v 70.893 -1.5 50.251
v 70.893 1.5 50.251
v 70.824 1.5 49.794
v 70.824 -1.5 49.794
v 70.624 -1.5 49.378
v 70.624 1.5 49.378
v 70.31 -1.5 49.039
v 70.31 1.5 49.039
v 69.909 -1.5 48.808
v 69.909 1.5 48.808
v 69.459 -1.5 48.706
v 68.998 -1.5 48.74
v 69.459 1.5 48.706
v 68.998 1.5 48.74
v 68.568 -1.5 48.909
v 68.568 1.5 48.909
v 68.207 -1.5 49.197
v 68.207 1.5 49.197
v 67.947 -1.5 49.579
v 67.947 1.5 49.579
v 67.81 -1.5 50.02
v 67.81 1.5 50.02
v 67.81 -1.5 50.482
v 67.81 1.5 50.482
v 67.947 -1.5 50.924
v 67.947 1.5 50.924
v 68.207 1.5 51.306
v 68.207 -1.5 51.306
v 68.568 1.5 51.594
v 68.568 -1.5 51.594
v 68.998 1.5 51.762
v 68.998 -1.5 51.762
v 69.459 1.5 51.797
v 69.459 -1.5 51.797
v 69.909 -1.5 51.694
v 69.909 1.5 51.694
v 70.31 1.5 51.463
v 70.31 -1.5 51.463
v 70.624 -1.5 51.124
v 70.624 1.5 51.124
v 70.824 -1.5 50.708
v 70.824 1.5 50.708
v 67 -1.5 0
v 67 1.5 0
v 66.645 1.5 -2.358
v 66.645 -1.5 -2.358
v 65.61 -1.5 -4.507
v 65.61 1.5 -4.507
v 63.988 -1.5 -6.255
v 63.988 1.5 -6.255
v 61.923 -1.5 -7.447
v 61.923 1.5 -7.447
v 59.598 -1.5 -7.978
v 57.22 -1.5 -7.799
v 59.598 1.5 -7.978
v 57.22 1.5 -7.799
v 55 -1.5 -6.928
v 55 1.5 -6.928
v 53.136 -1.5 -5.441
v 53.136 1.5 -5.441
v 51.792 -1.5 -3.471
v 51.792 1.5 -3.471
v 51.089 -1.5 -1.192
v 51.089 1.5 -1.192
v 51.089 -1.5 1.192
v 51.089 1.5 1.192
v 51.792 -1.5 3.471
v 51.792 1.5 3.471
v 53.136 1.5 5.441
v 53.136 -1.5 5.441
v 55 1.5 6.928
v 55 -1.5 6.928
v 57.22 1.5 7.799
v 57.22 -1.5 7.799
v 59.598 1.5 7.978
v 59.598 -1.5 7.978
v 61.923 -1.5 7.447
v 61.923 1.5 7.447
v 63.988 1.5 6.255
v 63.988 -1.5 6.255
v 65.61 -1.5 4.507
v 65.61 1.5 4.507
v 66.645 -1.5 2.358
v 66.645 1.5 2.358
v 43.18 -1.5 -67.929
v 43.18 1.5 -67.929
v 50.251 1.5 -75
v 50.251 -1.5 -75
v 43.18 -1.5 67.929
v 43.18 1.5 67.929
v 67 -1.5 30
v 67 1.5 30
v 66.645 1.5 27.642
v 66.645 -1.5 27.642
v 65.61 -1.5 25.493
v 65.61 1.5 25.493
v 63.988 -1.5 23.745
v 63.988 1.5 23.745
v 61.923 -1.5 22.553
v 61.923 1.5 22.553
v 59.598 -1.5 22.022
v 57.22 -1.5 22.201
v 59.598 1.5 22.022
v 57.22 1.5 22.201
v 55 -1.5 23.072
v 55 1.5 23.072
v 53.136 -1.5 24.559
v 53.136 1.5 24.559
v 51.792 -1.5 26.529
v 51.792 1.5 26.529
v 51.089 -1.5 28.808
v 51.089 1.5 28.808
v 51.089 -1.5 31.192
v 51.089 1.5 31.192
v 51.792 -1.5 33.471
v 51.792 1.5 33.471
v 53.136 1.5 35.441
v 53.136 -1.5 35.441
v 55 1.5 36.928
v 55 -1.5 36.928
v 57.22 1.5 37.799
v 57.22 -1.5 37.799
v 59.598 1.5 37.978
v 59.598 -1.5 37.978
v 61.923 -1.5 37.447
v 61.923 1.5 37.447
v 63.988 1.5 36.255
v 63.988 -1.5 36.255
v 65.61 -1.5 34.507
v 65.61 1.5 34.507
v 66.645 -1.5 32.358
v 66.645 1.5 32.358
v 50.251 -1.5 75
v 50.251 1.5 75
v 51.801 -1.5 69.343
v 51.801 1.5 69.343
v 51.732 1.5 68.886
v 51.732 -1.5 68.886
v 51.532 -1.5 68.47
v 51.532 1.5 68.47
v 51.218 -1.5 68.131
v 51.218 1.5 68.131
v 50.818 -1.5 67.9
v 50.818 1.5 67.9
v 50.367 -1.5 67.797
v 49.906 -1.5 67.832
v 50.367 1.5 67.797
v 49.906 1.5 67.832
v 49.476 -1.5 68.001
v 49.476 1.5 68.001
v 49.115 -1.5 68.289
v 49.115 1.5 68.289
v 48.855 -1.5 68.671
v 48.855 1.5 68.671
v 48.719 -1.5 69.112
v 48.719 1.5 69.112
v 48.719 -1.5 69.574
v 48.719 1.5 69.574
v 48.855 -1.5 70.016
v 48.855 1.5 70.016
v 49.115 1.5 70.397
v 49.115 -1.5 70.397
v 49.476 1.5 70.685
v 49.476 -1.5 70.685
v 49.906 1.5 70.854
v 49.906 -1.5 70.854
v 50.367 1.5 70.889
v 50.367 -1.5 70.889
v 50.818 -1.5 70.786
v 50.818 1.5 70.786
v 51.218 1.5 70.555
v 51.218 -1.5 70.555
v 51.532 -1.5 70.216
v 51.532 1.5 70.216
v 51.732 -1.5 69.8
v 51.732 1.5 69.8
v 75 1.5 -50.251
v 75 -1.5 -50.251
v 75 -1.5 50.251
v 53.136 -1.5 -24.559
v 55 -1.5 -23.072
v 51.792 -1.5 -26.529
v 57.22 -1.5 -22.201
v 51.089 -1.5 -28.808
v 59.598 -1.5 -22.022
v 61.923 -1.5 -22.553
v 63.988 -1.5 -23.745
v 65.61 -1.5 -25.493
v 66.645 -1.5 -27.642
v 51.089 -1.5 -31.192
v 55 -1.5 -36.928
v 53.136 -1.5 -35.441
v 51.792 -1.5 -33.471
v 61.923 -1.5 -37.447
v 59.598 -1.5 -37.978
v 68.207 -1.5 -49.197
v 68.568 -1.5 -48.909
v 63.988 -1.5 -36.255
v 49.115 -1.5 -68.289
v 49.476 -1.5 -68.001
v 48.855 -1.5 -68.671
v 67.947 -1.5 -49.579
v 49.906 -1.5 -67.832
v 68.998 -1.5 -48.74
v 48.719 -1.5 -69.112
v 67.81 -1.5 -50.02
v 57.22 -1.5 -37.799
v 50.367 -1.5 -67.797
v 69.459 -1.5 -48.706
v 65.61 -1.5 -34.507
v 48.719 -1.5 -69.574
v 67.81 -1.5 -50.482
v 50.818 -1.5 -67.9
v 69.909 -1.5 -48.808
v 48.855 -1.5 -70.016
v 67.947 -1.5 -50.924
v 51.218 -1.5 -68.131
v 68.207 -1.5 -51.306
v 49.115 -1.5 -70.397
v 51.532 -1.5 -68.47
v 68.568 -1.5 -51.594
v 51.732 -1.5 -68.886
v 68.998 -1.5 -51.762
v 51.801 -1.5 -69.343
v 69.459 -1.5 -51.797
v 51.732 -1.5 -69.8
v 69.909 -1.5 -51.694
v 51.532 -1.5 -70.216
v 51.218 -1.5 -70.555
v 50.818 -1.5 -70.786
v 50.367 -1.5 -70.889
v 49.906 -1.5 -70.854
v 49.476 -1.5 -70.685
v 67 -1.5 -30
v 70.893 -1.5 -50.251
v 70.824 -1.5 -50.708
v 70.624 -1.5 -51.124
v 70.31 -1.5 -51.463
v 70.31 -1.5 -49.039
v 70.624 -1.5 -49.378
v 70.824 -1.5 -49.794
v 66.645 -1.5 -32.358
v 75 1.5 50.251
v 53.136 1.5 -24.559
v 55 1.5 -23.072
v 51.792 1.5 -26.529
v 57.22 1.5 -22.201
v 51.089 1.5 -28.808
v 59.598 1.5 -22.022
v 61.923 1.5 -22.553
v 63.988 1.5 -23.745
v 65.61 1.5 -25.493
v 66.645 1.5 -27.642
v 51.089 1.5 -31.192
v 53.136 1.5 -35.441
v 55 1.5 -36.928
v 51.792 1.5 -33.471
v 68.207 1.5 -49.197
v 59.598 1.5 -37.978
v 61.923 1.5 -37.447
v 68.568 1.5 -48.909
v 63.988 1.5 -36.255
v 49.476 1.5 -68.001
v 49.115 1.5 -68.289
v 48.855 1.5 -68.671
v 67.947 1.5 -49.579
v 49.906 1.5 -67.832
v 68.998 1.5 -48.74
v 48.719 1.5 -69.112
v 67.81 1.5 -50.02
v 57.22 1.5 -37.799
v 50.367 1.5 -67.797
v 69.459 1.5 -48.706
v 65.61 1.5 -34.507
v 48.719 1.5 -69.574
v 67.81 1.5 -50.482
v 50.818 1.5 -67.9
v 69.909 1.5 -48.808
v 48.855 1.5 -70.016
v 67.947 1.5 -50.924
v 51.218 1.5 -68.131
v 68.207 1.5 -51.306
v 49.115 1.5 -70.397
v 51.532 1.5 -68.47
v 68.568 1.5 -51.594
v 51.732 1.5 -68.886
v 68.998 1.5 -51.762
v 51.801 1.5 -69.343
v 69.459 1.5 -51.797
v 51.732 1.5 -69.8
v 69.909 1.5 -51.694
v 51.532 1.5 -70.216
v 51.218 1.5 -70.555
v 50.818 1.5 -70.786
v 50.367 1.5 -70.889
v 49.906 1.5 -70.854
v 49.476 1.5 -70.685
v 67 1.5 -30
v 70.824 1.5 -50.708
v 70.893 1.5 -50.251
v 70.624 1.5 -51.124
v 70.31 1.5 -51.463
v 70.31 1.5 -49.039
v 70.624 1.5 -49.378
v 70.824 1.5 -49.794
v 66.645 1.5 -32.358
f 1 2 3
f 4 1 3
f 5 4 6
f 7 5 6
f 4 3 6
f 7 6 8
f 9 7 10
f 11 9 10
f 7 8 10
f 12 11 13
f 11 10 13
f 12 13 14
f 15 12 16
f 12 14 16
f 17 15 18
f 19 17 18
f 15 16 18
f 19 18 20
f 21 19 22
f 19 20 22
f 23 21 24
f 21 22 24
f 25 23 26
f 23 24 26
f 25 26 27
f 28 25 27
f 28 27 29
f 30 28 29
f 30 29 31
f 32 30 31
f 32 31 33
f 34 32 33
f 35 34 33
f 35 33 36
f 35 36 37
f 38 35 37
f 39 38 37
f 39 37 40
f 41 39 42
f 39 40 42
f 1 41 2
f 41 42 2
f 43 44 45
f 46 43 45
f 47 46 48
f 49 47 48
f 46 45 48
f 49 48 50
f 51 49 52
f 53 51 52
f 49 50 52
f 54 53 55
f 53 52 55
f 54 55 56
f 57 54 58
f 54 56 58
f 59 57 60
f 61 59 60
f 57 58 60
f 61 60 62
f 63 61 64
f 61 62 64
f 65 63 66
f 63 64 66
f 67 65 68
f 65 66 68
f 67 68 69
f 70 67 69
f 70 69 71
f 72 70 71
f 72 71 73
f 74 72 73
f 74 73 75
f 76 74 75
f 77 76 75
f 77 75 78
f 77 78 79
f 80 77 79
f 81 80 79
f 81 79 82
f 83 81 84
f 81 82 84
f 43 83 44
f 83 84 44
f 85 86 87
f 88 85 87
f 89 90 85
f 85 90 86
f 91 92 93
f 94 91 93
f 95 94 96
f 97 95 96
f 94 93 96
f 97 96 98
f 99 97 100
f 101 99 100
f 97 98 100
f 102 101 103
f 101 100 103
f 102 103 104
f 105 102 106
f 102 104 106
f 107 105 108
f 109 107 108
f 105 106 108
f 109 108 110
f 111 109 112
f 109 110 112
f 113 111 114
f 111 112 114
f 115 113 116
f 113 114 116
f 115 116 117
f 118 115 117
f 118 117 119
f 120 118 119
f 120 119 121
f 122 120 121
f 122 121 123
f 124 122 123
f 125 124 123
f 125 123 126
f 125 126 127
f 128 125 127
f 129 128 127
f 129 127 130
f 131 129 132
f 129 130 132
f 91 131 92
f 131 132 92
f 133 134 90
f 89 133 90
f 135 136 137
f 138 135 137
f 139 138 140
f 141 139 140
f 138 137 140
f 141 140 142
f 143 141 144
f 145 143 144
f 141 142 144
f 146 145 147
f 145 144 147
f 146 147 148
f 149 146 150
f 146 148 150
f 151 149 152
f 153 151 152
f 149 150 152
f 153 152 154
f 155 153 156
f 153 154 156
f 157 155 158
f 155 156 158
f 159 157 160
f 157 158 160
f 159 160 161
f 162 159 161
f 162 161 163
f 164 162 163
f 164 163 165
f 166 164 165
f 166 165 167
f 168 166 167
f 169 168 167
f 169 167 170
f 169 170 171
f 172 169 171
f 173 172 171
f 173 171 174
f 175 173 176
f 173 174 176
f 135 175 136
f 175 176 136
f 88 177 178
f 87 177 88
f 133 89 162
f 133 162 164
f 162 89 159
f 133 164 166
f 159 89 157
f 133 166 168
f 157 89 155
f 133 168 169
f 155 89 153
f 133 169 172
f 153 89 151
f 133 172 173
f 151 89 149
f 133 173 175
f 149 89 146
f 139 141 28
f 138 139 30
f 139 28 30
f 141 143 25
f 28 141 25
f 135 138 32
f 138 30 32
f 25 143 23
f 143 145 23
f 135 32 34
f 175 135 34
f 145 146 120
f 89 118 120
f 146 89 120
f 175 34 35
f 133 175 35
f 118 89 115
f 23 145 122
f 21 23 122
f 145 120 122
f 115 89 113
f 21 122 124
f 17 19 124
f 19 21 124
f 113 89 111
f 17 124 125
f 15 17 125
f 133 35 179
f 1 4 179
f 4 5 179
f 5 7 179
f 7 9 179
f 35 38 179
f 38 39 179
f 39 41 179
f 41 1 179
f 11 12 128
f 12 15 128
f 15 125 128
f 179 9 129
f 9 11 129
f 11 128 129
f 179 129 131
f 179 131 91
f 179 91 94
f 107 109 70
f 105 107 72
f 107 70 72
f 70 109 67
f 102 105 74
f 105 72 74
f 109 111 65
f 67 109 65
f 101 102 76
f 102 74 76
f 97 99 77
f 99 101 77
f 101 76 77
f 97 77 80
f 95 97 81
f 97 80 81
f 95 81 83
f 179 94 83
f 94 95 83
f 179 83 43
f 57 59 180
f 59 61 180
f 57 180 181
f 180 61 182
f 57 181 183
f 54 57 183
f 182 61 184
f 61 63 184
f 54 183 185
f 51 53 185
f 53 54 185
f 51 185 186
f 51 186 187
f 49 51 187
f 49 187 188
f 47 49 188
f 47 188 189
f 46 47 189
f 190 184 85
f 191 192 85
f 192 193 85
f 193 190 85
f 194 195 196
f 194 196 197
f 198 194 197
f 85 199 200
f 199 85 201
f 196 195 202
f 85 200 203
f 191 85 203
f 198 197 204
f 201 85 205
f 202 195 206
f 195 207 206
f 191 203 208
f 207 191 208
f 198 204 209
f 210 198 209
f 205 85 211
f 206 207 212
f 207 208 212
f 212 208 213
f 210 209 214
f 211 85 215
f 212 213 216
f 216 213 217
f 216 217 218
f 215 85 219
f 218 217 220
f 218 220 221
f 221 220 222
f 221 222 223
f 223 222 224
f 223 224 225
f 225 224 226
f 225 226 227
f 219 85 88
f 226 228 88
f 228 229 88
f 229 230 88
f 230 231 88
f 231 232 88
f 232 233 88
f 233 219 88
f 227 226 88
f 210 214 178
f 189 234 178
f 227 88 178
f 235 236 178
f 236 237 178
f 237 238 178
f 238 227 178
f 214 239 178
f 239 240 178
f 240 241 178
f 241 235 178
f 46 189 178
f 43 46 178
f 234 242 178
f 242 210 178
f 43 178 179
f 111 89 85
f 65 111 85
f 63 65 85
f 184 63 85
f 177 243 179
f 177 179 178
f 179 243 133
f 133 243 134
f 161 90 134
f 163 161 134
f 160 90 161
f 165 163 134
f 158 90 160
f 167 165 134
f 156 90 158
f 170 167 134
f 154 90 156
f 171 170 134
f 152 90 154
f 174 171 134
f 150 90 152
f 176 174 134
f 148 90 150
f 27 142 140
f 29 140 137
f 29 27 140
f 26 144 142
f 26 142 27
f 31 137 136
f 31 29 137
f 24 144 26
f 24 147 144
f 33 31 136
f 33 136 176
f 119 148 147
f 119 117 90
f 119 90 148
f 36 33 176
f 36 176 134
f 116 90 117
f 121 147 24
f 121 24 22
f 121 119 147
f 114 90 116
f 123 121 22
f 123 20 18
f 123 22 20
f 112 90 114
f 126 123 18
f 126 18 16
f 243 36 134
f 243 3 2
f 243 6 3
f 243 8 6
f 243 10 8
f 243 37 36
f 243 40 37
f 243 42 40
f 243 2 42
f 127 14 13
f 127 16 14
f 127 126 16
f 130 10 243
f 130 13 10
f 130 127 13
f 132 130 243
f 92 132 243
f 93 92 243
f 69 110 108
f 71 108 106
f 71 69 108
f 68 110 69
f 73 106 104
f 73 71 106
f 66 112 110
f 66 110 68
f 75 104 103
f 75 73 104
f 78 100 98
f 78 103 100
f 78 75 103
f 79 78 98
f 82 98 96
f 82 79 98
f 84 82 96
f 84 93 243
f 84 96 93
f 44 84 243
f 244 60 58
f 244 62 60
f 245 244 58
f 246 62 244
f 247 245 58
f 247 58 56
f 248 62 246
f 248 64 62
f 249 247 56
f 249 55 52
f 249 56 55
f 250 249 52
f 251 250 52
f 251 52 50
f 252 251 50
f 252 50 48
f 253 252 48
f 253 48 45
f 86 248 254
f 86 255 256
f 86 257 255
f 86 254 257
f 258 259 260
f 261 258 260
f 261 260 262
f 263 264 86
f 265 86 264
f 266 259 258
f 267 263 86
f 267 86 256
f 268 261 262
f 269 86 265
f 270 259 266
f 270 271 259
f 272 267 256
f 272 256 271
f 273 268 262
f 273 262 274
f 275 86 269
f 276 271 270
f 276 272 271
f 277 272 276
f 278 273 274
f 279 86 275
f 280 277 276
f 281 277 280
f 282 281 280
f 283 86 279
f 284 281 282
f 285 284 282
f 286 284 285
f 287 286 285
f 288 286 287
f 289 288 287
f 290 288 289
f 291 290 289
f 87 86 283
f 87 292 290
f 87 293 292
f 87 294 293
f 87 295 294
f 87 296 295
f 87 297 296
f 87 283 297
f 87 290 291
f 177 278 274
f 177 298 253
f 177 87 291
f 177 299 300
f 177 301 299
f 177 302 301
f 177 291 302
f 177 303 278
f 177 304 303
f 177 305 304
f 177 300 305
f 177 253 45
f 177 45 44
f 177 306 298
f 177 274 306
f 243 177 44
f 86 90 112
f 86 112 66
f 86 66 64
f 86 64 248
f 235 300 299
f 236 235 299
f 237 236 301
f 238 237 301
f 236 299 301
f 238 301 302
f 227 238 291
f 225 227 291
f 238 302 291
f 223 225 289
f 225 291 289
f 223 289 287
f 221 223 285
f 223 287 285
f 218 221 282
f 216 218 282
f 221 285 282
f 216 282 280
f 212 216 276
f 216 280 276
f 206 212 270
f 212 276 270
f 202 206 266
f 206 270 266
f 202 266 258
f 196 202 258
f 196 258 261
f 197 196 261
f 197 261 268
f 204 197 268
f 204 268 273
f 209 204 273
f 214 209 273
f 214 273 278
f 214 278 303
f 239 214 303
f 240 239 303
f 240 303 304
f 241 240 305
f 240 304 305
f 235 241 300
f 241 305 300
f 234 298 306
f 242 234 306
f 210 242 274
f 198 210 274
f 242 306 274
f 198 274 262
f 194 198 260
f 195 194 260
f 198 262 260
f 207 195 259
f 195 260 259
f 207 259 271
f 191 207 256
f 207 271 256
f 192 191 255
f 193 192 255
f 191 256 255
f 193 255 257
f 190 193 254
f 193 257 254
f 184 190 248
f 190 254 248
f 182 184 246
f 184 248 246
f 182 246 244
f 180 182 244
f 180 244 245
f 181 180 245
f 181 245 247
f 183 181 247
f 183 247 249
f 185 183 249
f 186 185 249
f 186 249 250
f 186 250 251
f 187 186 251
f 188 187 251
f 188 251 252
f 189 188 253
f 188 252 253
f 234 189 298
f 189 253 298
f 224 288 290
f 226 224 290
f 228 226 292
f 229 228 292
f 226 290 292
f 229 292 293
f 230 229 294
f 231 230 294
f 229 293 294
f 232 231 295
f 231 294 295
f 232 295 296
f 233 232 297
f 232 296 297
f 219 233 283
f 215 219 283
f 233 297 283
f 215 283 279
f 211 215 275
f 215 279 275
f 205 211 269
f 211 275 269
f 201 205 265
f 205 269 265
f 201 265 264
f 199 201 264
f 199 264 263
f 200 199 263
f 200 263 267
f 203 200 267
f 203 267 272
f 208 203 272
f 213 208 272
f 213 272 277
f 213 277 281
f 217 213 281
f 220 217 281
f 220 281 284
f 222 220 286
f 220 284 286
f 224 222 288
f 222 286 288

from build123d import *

# Parameters (mm, degrees)
SKETCH1_W           = 150
SKETCH1_H           = 150
BOSS_EXTRUDE1_DEPTH = 1.5
CUT_EXTRUDE1_DEPTH  = 3
SKETCH3_R           = 1.55
CUT_EXTRUDE2_DEPTH  = 3
CUT_EXTRUDE3_DEPTH  = 3
SKETCH5_R           = 8
CUT_EXTRUDE4_DEPTH  = 3


with BuildPart() as part:
    # Sketch1 → Boss-Extrude1 (new body, symmetric)
    with BuildSketch(Plane(origin=(0, 0, 0), x_dir=(1, 0, 0), z_dir=(0, 1, 0))):
        Rectangle(SKETCH1_W, SKETCH1_H)
    extrude(amount=BOSS_EXTRUDE1_DEPTH, both=True)

    # Sketch2 → Cut-Extrude1 (cut)
    with BuildSketch(Plane(origin=(0, 1.5, 0), x_dir=(1, 0, 0), z_dir=(0, 1, 0))):
        Polygon((50.251262658, 75), (75, 75), (75, 50.251262658), align=None)
        Polygon((-75, 75), (-75, 50.251262658), (-50.251262658, 75), align=None)
        Polygon((-50.251262658, -75), (-75, -75), (-75, -50.251262658), align=None)
        Polygon((75, -75), (75, -50.251262658), (50.251262658, -75), align=None)
    extrude(amount=-CUT_EXTRUDE1_DEPTH, mode=Mode.SUBTRACT)

    # Sketch3 → Cut-Extrude2 (cut)
    with BuildSketch(Plane(origin=(0, 1.5, 0), x_dir=(1, 0, 0), z_dir=(0, 1, 0))):
        with Locations((69.343145751, 50.251262658)):
            Circle(SKETCH3_R)
        with Locations((50.251262658, 69.343145751)):
            Circle(SKETCH3_R)
        with Locations((-69.343145751, 50.251262658)):
            Circle(SKETCH3_R)
        with Locations((-50.251262658, 69.343145751)):
            Circle(SKETCH3_R)
        with Locations((-69.343145751, -50.251262658)):
            Circle(SKETCH3_R)
        with Locations((-50.251262658, -69.343145751)):
            Circle(SKETCH3_R)
        with Locations((69.343145751, -50.251262658)):
            Circle(SKETCH3_R)
        with Locations((50.251262658, -69.343145751)):
            Circle(SKETCH3_R)
    extrude(amount=-CUT_EXTRUDE2_DEPTH, mode=Mode.SUBTRACT)

    # Sketch4 → Cut-Extrude3 (cut)
    with BuildSketch(Plane(origin=(0, 1.5, 0), x_dir=(1, 0, 0), z_dir=(0, 1, 0))):
        Polygon((50.251262658, 75), (-50.251262658, 75), (-75, 50.251262658), (-75, -50.251262658), (-50.251262658, -75), (50.251262658, -75), (43.180194847, -67.928932188), (43.180194847, 67.928932188), align=None)
    extrude(amount=-CUT_EXTRUDE3_DEPTH, mode=Mode.SUBTRACT)

    # Sketch5 → Cut-Extrude4 (cut)
    with BuildSketch(Plane(origin=(0, 1.5, 0), x_dir=(1, 0, 0), z_dir=(0, 1, 0))):
        with Locations((59, 0)):
            Circle(SKETCH5_R)
        with Locations((59, 30)):
            Circle(SKETCH5_R)
        with Locations((59, -30)):
            Circle(SKETCH5_R)
    extrude(amount=-CUT_EXTRUDE4_DEPTH, mode=Mode.SUBTRACT)


solid = part.part
